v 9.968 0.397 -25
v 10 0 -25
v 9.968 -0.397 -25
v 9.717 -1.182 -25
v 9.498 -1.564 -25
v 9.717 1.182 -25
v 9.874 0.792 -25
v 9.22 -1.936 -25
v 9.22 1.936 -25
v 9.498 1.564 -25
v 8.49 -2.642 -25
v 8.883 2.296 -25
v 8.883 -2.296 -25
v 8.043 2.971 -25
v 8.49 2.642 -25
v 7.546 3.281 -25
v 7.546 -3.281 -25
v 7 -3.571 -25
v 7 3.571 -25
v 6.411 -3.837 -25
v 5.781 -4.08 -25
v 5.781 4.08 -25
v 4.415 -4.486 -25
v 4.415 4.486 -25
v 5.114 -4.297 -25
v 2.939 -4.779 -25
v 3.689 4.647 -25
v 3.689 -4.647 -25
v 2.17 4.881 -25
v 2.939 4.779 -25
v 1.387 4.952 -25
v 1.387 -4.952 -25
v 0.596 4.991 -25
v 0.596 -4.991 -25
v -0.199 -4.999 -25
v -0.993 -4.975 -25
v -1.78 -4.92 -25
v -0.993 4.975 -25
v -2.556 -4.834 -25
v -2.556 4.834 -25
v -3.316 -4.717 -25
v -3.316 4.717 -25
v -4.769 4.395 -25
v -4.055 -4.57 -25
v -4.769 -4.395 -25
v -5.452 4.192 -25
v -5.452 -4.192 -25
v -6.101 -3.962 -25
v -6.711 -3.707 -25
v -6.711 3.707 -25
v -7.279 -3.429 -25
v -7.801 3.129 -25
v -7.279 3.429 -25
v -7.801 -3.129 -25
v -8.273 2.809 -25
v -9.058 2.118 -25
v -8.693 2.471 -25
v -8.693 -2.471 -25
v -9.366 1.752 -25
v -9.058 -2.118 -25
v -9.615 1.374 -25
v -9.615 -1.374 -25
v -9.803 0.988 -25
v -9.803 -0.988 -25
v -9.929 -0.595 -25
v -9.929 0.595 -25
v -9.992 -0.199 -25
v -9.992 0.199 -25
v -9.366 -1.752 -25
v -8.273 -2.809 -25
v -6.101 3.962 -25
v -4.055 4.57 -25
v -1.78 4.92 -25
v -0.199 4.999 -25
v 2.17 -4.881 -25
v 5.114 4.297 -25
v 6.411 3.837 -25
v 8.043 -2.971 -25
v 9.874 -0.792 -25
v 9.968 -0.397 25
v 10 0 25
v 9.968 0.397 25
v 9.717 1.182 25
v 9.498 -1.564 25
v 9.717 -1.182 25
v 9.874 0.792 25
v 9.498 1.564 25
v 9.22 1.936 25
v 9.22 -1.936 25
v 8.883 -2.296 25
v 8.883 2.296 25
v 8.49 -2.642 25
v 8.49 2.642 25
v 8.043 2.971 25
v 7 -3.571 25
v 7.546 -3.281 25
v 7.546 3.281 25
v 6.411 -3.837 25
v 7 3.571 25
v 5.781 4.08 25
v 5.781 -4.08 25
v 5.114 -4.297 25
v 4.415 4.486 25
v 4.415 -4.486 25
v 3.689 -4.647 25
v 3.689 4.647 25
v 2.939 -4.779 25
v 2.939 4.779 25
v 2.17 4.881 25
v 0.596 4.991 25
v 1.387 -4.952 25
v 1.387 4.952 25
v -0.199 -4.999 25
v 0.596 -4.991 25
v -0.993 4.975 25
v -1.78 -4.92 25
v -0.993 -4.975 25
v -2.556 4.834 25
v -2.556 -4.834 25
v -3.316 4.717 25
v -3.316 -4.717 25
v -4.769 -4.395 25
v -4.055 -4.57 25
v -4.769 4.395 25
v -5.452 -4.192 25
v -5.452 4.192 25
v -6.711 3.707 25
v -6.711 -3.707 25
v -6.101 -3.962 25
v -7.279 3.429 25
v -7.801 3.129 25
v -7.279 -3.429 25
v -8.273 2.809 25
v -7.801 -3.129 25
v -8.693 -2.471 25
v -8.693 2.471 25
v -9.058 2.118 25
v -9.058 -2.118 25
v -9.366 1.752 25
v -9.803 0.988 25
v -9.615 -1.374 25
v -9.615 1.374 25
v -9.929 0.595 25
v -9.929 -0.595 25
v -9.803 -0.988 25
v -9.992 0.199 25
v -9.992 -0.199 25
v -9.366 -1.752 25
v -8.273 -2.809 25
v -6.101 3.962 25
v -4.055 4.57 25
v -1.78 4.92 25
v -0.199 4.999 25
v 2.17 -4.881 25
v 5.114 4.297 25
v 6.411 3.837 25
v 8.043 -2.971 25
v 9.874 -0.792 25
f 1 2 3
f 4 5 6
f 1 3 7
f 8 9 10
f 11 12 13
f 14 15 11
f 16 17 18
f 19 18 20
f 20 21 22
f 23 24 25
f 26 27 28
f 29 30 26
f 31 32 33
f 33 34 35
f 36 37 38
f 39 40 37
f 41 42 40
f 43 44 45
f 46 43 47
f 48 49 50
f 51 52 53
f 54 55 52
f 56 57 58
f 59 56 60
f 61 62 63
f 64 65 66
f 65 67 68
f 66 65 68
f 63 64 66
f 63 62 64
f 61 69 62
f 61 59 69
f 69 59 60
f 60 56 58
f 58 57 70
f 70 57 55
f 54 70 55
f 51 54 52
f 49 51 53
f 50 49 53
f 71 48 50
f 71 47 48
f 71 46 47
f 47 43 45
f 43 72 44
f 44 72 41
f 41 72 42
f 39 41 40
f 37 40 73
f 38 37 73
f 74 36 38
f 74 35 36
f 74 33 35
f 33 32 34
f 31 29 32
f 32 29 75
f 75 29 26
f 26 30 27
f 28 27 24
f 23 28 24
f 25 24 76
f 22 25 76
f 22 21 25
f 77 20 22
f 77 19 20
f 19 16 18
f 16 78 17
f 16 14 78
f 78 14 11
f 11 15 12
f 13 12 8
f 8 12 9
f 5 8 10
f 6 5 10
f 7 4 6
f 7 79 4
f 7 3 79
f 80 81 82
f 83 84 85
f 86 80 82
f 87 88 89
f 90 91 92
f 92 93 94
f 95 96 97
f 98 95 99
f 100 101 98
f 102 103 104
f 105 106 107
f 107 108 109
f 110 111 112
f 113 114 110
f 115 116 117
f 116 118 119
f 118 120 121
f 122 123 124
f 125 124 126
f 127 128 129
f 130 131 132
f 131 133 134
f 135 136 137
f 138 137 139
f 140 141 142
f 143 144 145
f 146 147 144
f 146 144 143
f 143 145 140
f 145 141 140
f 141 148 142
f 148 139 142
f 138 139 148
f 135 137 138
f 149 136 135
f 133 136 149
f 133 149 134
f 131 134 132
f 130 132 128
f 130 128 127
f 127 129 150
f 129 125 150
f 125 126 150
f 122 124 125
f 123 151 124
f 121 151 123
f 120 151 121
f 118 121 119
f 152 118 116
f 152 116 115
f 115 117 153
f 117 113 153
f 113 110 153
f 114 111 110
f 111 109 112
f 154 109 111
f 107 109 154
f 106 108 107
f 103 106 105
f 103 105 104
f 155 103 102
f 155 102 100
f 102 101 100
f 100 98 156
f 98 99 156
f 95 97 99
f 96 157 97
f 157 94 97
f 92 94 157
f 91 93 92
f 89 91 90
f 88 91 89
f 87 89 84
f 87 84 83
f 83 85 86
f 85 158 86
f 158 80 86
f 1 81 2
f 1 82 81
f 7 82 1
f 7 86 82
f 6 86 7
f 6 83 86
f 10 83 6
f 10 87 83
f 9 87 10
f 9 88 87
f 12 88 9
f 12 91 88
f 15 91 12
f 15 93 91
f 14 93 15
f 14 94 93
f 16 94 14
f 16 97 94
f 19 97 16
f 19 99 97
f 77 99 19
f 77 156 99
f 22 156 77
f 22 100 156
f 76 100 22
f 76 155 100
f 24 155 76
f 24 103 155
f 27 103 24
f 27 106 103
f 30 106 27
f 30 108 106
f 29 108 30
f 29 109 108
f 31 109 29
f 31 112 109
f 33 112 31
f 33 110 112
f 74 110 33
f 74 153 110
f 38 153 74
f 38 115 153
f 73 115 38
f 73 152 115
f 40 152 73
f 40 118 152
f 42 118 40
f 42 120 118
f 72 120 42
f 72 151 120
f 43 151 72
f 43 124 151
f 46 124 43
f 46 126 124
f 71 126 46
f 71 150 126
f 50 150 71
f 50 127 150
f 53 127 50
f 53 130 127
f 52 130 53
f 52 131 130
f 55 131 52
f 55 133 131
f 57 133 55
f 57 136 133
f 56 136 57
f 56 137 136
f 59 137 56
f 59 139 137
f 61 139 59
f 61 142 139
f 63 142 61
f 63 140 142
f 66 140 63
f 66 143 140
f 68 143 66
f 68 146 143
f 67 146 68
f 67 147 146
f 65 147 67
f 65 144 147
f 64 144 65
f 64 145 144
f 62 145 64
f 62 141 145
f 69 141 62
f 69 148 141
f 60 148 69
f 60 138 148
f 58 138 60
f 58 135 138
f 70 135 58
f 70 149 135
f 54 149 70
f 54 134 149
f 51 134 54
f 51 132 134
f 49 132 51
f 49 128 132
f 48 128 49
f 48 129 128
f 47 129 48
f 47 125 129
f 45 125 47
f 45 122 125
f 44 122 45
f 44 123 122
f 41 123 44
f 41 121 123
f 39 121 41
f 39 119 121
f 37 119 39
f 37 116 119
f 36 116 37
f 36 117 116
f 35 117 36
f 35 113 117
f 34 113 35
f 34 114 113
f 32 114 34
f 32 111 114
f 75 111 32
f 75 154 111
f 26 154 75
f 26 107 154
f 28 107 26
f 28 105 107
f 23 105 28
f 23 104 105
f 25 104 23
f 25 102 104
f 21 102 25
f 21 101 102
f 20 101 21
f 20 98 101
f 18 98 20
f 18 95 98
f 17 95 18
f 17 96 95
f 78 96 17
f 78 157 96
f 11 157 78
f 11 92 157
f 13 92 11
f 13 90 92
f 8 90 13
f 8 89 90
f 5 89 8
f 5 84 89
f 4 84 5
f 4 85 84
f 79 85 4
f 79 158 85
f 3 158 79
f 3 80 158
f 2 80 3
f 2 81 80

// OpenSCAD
$fa=1;
$fs=0.4;

linear_extrude(height=50, center=true)
    scale([2, 1, 1])
        circle(d=10);
